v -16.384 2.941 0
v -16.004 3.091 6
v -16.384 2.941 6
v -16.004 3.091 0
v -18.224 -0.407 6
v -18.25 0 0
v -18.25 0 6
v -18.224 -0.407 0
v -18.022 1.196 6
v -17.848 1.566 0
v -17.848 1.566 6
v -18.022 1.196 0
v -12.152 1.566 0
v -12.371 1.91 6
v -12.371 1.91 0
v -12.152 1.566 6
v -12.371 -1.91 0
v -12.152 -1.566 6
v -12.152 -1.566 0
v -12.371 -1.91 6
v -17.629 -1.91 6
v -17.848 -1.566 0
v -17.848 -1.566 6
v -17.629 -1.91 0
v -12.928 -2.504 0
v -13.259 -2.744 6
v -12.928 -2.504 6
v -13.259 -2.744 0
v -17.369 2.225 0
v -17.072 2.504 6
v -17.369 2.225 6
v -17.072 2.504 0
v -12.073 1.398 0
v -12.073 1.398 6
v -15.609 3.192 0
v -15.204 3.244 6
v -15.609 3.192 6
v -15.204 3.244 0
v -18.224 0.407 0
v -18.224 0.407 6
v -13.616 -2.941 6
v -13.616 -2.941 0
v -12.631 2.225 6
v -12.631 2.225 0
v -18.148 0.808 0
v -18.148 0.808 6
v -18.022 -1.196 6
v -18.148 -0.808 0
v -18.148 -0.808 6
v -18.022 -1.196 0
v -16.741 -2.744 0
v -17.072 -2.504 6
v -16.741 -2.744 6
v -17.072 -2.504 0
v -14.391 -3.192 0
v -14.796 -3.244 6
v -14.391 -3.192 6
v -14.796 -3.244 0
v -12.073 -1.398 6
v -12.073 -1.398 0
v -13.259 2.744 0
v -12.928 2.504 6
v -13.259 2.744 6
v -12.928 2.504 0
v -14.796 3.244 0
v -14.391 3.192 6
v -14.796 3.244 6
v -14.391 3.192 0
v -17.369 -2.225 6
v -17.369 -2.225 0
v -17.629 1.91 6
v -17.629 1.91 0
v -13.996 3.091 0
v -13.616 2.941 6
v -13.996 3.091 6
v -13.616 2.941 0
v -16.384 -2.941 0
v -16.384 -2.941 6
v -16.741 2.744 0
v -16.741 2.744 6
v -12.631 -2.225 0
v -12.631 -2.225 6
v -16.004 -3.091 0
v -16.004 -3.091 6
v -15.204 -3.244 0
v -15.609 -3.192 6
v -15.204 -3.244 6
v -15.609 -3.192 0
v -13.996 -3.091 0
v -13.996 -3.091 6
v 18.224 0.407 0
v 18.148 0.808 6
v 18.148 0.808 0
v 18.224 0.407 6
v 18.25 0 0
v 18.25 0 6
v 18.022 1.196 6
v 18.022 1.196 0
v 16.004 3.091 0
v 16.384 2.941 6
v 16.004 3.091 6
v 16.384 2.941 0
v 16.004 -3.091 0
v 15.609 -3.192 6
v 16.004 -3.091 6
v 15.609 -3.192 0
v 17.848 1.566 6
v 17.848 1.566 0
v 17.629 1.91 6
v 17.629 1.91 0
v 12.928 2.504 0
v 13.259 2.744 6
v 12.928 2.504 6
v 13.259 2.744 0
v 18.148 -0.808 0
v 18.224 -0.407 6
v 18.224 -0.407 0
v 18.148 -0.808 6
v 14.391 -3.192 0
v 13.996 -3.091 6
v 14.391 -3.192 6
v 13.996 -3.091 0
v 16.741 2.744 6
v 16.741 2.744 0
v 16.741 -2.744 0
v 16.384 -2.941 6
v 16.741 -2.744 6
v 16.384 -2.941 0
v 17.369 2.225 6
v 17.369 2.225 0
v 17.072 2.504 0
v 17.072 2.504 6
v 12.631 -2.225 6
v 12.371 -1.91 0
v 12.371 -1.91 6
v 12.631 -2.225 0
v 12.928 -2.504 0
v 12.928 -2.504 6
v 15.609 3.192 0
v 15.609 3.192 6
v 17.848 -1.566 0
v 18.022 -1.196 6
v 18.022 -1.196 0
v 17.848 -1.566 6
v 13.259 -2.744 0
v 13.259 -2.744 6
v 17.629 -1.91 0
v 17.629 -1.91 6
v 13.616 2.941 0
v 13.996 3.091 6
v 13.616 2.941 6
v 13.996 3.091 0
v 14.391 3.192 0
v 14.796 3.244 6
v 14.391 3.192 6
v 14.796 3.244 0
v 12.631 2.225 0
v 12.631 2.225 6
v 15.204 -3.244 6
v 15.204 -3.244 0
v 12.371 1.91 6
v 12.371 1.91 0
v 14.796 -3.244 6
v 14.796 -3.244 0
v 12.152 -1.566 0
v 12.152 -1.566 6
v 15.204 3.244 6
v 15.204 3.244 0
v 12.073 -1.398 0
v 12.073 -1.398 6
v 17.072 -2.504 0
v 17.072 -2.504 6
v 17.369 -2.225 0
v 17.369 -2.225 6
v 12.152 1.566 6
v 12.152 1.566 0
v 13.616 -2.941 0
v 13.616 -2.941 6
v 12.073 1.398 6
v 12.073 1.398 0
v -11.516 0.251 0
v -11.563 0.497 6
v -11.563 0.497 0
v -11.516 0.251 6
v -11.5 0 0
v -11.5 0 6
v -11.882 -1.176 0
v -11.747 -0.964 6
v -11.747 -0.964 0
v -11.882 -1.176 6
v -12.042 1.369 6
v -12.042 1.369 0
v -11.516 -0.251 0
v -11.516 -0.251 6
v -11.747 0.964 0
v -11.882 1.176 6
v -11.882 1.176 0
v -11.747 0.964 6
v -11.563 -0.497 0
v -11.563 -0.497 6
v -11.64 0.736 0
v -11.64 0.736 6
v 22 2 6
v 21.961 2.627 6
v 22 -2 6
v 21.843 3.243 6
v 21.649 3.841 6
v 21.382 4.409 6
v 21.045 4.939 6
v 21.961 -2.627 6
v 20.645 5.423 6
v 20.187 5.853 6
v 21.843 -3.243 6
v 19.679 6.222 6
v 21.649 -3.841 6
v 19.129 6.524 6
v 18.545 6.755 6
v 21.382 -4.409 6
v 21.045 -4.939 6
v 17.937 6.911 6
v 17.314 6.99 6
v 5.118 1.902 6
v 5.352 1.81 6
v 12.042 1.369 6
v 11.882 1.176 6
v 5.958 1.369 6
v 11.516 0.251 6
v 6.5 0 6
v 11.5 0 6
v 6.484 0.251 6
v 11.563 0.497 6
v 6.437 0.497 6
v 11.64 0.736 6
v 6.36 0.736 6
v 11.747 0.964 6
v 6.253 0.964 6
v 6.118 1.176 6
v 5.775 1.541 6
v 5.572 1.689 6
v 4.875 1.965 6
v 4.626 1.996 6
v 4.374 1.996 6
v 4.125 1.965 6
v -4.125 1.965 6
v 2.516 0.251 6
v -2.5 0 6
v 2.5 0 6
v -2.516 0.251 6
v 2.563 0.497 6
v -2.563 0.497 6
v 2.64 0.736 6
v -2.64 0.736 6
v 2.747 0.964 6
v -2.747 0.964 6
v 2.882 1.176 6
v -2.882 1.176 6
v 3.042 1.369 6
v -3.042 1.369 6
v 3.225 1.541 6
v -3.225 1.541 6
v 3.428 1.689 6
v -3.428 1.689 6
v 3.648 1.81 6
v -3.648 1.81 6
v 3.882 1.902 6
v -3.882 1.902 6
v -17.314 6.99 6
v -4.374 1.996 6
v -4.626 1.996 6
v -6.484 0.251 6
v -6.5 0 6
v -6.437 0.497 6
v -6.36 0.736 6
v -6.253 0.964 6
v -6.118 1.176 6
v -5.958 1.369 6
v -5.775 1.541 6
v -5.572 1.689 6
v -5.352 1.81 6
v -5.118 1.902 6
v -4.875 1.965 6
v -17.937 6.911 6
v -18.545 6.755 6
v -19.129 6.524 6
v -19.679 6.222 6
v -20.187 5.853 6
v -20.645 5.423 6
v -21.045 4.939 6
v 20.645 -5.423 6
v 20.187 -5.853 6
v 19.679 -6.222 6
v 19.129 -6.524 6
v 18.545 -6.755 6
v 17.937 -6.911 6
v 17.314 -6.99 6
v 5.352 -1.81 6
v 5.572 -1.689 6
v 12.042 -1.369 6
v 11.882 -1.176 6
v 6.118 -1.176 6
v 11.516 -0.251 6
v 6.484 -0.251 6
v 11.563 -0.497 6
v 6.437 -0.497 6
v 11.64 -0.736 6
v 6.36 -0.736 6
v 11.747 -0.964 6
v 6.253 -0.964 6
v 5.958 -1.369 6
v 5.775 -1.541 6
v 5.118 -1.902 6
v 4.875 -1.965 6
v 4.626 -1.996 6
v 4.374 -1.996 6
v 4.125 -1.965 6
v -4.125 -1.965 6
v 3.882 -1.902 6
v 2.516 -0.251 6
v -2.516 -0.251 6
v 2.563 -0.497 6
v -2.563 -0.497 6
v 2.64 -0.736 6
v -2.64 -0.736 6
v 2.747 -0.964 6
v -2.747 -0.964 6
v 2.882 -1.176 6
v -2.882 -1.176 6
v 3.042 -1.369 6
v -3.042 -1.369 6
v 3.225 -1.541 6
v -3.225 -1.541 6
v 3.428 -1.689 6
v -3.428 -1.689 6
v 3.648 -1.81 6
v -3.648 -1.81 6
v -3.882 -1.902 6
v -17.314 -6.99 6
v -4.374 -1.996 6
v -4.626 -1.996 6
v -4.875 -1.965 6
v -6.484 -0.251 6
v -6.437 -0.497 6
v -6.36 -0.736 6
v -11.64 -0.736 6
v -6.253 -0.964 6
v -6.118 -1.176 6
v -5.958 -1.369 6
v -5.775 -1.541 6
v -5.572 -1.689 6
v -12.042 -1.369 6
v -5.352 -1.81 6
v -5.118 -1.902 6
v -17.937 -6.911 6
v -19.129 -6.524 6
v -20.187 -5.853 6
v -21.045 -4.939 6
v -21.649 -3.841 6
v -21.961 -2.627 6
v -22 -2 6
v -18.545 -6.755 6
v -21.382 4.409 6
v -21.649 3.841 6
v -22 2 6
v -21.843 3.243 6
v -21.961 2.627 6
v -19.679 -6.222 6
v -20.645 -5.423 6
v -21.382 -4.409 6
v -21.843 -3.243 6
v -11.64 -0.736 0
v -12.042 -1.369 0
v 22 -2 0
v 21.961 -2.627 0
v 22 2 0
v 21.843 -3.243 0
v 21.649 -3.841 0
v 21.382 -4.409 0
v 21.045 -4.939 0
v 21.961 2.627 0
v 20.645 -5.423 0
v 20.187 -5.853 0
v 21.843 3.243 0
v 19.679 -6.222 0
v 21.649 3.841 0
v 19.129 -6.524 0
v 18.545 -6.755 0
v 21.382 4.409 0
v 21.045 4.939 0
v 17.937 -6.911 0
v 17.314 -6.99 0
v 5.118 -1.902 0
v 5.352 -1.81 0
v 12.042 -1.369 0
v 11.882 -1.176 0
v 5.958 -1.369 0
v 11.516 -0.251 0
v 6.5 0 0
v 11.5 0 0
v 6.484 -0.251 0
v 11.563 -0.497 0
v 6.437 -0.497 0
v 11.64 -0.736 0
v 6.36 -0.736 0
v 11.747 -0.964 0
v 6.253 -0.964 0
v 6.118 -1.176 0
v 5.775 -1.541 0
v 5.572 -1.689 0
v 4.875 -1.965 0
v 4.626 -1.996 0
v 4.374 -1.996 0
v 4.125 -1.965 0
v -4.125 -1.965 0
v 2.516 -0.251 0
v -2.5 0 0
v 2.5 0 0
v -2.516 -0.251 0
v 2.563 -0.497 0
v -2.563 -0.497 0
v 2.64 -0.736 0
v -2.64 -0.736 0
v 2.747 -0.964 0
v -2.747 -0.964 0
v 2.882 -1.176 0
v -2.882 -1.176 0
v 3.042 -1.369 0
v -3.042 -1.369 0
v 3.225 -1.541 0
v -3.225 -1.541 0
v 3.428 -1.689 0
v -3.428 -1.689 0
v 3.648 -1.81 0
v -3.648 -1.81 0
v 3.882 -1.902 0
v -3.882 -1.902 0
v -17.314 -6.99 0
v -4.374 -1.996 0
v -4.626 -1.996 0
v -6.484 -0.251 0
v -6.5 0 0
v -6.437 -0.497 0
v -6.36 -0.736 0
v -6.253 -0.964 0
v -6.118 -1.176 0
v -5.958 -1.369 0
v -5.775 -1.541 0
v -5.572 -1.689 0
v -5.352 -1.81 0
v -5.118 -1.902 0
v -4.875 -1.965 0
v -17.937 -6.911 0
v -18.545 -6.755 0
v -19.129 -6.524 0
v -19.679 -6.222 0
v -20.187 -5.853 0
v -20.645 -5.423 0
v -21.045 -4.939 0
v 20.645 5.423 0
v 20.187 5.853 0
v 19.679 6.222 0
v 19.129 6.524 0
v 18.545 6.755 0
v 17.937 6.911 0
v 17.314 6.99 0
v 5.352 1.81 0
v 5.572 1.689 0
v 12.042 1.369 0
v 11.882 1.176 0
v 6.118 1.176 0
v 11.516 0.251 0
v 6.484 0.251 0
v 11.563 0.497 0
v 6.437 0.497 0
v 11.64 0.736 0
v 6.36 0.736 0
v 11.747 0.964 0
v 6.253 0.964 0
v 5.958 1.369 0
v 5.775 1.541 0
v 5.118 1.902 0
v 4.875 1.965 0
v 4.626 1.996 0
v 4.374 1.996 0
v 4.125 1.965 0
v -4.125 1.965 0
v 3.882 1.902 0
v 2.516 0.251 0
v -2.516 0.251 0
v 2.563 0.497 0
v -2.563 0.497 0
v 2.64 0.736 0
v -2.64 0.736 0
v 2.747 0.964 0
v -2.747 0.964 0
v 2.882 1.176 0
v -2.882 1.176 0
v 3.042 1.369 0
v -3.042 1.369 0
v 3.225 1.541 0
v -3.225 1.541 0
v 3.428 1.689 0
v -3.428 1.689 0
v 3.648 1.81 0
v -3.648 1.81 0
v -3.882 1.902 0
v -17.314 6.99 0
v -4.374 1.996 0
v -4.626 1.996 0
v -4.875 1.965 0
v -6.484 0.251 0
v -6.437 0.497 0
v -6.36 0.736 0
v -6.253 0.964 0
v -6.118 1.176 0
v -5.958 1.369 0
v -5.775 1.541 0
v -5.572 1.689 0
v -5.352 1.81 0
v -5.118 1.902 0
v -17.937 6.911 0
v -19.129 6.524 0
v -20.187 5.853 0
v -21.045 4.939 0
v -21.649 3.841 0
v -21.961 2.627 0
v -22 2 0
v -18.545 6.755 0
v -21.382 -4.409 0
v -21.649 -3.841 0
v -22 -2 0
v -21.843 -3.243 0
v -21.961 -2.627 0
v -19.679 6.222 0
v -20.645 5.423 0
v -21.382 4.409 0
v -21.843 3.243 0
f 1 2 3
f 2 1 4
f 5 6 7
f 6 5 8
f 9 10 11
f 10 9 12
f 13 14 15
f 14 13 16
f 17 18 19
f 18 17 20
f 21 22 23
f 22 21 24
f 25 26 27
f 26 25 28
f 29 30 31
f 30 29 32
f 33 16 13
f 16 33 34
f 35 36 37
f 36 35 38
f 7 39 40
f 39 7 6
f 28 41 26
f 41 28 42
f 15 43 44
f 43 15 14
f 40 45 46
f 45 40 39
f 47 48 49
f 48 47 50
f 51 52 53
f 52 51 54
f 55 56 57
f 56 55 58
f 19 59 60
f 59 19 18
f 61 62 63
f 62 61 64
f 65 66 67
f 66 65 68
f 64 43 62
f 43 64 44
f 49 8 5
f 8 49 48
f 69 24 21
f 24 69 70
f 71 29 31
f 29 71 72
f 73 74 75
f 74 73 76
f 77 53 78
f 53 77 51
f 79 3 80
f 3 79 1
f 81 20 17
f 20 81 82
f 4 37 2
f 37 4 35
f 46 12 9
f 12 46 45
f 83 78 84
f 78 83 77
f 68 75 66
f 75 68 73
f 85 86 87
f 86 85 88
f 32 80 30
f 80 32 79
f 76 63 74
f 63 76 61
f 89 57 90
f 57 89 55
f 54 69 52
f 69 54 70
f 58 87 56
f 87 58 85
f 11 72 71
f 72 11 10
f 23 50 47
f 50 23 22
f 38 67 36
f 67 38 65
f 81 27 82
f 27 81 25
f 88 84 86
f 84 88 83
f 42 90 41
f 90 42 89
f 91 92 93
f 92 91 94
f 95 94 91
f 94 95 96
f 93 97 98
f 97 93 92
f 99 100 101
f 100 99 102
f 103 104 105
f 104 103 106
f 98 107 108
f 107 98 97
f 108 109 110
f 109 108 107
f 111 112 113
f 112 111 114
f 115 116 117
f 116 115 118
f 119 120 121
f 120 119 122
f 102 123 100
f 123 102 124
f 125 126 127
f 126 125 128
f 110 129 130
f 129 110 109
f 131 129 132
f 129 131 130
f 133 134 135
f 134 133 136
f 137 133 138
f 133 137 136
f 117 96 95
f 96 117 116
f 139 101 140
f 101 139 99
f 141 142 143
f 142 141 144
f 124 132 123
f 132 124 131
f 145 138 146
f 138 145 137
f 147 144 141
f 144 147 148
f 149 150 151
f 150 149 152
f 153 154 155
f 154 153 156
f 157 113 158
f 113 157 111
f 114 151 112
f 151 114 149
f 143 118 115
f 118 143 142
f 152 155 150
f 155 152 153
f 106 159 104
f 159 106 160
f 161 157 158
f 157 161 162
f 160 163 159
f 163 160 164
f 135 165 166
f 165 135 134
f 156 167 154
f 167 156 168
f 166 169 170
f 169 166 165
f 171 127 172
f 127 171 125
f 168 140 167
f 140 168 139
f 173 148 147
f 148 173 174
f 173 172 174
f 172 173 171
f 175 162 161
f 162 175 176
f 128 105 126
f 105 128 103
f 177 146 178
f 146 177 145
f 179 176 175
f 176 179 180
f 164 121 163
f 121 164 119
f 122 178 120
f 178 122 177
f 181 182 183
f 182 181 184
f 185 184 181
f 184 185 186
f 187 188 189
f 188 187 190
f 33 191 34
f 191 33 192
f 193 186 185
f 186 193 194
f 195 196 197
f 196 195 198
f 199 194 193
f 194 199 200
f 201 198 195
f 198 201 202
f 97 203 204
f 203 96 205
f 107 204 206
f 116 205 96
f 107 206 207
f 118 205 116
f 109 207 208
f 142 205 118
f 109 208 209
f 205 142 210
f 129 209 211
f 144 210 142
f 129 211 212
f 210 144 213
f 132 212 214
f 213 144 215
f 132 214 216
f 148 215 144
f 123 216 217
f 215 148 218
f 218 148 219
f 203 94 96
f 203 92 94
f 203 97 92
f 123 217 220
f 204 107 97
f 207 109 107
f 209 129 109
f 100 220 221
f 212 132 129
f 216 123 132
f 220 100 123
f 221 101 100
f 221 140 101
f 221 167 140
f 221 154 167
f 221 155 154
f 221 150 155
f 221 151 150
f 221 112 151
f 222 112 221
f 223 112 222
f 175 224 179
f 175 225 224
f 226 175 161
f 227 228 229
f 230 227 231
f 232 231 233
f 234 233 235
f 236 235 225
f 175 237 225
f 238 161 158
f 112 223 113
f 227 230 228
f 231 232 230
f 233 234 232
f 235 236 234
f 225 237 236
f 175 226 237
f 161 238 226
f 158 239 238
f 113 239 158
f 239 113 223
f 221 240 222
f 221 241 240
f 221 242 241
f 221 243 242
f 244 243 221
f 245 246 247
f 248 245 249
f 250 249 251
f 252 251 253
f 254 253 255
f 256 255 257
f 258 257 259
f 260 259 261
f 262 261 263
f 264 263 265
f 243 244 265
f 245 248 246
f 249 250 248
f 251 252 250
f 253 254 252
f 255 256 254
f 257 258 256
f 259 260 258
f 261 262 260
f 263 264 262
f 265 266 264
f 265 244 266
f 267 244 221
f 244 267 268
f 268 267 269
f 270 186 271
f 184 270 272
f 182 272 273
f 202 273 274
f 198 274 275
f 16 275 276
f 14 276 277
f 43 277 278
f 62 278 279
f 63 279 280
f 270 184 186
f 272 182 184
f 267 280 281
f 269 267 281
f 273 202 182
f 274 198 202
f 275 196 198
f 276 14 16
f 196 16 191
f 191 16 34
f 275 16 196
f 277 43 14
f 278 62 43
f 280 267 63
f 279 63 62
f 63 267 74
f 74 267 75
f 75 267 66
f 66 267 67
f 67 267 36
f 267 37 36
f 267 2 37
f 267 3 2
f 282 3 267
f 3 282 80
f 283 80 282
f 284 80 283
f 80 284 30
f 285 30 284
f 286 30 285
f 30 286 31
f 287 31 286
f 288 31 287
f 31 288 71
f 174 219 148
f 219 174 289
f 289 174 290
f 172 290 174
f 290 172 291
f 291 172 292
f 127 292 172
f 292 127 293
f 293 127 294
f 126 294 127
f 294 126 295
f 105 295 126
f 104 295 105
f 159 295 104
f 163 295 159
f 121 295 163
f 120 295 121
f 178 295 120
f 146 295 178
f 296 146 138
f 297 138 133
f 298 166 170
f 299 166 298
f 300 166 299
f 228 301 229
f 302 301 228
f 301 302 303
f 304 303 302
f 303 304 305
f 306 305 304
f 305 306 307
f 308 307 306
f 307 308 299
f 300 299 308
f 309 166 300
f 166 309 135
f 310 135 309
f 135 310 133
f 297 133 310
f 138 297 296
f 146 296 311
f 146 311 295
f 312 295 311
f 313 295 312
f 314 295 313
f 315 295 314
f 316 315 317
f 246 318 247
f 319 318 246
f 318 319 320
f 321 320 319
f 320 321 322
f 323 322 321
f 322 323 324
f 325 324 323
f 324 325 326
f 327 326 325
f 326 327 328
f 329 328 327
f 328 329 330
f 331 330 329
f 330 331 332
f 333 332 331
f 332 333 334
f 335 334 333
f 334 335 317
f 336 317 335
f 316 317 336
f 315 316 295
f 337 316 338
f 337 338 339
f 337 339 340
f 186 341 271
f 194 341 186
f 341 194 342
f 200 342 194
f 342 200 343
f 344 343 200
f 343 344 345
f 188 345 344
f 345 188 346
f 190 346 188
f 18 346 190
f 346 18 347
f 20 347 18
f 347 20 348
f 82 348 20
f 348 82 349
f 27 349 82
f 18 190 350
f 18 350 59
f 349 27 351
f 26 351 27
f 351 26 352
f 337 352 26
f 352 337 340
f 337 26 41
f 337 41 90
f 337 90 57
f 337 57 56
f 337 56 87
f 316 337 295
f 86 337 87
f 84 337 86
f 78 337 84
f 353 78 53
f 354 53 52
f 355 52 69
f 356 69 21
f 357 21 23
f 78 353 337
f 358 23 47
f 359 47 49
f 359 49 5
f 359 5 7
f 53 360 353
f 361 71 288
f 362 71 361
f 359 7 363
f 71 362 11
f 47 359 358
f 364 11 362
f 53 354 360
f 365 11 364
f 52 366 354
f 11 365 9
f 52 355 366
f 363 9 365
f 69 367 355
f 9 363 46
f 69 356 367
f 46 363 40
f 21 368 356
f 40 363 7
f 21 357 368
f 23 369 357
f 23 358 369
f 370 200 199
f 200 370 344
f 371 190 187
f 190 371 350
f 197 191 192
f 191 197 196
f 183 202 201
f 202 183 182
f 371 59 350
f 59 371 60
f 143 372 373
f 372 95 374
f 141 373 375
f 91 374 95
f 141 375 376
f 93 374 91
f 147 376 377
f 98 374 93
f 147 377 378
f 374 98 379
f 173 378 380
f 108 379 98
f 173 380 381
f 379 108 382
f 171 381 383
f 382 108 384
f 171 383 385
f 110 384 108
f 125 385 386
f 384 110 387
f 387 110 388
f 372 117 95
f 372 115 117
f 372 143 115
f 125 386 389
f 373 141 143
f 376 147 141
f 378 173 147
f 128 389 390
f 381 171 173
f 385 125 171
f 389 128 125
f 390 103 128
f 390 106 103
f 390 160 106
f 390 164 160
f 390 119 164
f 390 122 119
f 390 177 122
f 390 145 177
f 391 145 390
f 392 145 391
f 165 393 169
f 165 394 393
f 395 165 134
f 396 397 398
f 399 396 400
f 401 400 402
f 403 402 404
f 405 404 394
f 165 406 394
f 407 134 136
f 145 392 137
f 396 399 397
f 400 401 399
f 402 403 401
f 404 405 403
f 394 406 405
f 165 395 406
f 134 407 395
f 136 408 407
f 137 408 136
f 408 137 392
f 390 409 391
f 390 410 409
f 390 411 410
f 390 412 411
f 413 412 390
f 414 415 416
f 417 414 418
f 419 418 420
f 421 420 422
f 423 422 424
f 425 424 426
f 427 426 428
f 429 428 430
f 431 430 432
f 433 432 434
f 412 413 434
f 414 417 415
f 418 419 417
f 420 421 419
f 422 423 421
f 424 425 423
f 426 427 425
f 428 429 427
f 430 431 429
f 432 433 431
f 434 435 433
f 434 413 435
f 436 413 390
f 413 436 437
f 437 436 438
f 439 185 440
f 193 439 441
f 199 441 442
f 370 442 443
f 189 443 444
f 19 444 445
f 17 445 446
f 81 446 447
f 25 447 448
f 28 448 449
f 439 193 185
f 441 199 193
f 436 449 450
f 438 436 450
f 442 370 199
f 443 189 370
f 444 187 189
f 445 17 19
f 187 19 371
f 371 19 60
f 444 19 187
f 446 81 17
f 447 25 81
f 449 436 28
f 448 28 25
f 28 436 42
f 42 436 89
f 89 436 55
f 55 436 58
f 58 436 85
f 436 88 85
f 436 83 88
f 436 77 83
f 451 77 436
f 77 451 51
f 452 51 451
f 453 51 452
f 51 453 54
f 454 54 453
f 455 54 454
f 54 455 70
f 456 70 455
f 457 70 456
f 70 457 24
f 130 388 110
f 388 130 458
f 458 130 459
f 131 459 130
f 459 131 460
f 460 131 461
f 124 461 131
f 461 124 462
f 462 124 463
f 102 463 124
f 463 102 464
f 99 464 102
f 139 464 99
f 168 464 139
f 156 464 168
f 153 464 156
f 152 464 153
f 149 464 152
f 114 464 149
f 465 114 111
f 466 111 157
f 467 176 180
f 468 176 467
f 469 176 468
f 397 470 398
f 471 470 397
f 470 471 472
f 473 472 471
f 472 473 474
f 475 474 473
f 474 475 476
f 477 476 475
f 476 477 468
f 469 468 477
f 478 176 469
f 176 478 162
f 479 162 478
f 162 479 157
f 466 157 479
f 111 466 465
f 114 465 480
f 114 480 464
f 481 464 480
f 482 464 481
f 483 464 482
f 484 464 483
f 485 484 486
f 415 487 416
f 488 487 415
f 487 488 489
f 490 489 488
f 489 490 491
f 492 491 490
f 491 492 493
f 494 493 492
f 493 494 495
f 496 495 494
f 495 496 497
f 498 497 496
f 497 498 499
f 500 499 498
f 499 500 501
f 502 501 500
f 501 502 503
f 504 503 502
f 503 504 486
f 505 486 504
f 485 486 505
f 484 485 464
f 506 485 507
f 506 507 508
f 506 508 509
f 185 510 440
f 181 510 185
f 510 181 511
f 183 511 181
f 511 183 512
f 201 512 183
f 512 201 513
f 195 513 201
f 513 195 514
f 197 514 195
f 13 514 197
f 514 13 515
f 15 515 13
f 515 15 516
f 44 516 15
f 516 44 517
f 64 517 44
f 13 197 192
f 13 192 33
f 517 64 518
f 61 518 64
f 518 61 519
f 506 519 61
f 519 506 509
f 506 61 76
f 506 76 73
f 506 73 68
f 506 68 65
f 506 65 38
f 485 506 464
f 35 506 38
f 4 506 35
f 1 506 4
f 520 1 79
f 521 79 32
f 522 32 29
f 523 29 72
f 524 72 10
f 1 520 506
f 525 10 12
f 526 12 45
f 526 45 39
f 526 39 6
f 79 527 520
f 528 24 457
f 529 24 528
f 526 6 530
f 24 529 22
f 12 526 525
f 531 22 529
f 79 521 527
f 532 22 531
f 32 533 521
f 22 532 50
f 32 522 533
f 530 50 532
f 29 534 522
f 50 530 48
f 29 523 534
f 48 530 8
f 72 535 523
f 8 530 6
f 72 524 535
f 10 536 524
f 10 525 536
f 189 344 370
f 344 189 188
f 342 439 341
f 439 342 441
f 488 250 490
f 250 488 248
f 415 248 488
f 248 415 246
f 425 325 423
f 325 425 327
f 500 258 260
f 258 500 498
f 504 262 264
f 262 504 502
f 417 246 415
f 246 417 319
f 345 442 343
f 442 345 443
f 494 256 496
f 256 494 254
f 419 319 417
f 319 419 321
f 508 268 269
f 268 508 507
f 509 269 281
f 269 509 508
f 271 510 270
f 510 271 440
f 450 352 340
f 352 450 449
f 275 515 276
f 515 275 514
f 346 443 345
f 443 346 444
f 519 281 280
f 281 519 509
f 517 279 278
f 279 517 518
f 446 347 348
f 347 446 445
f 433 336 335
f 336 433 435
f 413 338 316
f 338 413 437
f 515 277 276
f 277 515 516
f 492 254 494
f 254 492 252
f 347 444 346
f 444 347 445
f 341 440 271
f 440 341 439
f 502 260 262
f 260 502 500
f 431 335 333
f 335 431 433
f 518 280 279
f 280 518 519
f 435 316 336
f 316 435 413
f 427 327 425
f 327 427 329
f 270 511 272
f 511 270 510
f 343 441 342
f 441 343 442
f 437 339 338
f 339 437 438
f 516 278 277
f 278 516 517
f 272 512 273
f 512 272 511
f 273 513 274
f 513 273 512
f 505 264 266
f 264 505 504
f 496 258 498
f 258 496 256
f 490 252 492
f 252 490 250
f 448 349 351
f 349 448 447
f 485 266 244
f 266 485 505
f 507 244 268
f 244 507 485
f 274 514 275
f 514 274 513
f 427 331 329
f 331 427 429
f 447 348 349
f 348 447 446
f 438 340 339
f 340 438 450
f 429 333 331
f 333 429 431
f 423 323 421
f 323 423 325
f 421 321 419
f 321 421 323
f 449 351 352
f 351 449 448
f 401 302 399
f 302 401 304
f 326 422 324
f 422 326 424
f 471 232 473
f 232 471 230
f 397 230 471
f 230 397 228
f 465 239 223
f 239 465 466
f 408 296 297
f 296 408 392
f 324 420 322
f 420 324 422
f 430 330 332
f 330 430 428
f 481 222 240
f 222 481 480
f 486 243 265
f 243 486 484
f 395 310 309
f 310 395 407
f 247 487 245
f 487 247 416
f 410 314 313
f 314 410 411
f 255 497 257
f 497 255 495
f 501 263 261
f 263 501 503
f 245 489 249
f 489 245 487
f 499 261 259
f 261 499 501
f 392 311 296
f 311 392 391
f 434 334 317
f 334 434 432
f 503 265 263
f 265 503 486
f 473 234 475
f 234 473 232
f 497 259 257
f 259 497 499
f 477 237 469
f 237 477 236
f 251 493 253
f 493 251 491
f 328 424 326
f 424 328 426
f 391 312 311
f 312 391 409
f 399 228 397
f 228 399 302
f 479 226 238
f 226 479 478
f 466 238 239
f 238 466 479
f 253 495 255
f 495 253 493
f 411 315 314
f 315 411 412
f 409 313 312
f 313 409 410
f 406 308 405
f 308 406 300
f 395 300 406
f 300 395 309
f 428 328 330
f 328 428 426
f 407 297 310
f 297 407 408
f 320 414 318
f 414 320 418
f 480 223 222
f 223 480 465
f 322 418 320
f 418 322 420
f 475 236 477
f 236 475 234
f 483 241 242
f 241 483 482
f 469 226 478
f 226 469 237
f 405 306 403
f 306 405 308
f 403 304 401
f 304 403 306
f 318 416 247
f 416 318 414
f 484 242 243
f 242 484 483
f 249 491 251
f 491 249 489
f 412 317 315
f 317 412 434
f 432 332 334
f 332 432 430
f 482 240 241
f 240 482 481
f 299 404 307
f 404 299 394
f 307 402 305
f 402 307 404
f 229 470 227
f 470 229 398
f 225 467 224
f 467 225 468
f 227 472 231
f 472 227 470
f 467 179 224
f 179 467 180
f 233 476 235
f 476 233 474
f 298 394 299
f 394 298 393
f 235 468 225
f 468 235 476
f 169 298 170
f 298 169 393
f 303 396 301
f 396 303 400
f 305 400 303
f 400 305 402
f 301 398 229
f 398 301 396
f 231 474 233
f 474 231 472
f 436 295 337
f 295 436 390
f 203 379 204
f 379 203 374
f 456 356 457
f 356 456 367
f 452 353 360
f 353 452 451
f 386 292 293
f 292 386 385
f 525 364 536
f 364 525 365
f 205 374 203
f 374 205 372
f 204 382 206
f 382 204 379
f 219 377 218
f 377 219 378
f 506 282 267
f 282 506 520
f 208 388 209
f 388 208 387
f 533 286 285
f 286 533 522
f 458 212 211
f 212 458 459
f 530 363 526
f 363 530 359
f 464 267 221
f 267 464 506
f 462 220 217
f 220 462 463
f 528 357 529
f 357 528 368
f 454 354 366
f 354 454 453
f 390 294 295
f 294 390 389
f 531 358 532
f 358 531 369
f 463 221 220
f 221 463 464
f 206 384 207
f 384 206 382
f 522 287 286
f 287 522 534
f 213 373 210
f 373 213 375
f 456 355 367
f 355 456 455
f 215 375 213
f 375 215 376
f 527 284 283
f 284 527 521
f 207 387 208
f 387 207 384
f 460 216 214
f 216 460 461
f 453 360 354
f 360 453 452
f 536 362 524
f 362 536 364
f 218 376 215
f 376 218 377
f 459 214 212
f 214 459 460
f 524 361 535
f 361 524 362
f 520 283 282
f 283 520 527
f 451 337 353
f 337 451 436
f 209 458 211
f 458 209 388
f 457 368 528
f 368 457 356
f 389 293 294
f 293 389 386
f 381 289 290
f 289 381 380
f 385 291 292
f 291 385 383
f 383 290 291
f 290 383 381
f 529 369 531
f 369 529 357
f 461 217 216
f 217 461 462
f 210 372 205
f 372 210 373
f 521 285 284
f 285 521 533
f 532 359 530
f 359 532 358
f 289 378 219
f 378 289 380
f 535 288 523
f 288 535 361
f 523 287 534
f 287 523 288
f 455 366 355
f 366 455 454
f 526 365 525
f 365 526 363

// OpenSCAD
$fn = 50;


difference() {
	union() {
		hull() {
			translate(v = [-17.0000000000, 2.0000000000, 0]) {
				cylinder(h = 6, r = 5);
			}
			translate(v = [17.0000000000, 2.0000000000, 0]) {
				cylinder(h = 6, r = 5);
			}
			translate(v = [-17.0000000000, -2.0000000000, 0]) {
				cylinder(h = 6, r = 5);
			}
			translate(v = [17.0000000000, -2.0000000000, 0]) {
				cylinder(h = 6, r = 5);
			}
		}
	}
	union() {
		#translate(v = [-15.0000000000, 0.0000000000, -100.0000000000]) {
			cylinder(h = 200, r = 3.2500000000);
		}
		#translate(v = [-15.0000000000, 0.0000000000, -100.0000000000]) {
			cylinder(h = 200, r = 3.2500000000);
		}
		#translate(v = [15.0000000000, 0.0000000000, -100.0000000000]) {
			cylinder(h = 200, r = 3.2500000000);
		}
		#translate(v = [15.0000000000, 0.0000000000, -100.0000000000]) {
			cylinder(h = 200, r = 3.2500000000);
		}
		#translate(v = [-13.5000000000, 0, 0]) {
			cylinder(h = 6, r = 2.0000000000);
		}
		#translate(v = [-4.5000000000, 0, 0]) {
			cylinder(h = 6, r = 2.0000000000);
		}
		#translate(v = [4.5000000000, 0, 0]) {
			cylinder(h = 6, r = 2.0000000000);
		}
		#translate(v = [13.5000000000, 0, 0]) {
			cylinder(h = 6, r = 2.0000000000);
		}
	}
}
